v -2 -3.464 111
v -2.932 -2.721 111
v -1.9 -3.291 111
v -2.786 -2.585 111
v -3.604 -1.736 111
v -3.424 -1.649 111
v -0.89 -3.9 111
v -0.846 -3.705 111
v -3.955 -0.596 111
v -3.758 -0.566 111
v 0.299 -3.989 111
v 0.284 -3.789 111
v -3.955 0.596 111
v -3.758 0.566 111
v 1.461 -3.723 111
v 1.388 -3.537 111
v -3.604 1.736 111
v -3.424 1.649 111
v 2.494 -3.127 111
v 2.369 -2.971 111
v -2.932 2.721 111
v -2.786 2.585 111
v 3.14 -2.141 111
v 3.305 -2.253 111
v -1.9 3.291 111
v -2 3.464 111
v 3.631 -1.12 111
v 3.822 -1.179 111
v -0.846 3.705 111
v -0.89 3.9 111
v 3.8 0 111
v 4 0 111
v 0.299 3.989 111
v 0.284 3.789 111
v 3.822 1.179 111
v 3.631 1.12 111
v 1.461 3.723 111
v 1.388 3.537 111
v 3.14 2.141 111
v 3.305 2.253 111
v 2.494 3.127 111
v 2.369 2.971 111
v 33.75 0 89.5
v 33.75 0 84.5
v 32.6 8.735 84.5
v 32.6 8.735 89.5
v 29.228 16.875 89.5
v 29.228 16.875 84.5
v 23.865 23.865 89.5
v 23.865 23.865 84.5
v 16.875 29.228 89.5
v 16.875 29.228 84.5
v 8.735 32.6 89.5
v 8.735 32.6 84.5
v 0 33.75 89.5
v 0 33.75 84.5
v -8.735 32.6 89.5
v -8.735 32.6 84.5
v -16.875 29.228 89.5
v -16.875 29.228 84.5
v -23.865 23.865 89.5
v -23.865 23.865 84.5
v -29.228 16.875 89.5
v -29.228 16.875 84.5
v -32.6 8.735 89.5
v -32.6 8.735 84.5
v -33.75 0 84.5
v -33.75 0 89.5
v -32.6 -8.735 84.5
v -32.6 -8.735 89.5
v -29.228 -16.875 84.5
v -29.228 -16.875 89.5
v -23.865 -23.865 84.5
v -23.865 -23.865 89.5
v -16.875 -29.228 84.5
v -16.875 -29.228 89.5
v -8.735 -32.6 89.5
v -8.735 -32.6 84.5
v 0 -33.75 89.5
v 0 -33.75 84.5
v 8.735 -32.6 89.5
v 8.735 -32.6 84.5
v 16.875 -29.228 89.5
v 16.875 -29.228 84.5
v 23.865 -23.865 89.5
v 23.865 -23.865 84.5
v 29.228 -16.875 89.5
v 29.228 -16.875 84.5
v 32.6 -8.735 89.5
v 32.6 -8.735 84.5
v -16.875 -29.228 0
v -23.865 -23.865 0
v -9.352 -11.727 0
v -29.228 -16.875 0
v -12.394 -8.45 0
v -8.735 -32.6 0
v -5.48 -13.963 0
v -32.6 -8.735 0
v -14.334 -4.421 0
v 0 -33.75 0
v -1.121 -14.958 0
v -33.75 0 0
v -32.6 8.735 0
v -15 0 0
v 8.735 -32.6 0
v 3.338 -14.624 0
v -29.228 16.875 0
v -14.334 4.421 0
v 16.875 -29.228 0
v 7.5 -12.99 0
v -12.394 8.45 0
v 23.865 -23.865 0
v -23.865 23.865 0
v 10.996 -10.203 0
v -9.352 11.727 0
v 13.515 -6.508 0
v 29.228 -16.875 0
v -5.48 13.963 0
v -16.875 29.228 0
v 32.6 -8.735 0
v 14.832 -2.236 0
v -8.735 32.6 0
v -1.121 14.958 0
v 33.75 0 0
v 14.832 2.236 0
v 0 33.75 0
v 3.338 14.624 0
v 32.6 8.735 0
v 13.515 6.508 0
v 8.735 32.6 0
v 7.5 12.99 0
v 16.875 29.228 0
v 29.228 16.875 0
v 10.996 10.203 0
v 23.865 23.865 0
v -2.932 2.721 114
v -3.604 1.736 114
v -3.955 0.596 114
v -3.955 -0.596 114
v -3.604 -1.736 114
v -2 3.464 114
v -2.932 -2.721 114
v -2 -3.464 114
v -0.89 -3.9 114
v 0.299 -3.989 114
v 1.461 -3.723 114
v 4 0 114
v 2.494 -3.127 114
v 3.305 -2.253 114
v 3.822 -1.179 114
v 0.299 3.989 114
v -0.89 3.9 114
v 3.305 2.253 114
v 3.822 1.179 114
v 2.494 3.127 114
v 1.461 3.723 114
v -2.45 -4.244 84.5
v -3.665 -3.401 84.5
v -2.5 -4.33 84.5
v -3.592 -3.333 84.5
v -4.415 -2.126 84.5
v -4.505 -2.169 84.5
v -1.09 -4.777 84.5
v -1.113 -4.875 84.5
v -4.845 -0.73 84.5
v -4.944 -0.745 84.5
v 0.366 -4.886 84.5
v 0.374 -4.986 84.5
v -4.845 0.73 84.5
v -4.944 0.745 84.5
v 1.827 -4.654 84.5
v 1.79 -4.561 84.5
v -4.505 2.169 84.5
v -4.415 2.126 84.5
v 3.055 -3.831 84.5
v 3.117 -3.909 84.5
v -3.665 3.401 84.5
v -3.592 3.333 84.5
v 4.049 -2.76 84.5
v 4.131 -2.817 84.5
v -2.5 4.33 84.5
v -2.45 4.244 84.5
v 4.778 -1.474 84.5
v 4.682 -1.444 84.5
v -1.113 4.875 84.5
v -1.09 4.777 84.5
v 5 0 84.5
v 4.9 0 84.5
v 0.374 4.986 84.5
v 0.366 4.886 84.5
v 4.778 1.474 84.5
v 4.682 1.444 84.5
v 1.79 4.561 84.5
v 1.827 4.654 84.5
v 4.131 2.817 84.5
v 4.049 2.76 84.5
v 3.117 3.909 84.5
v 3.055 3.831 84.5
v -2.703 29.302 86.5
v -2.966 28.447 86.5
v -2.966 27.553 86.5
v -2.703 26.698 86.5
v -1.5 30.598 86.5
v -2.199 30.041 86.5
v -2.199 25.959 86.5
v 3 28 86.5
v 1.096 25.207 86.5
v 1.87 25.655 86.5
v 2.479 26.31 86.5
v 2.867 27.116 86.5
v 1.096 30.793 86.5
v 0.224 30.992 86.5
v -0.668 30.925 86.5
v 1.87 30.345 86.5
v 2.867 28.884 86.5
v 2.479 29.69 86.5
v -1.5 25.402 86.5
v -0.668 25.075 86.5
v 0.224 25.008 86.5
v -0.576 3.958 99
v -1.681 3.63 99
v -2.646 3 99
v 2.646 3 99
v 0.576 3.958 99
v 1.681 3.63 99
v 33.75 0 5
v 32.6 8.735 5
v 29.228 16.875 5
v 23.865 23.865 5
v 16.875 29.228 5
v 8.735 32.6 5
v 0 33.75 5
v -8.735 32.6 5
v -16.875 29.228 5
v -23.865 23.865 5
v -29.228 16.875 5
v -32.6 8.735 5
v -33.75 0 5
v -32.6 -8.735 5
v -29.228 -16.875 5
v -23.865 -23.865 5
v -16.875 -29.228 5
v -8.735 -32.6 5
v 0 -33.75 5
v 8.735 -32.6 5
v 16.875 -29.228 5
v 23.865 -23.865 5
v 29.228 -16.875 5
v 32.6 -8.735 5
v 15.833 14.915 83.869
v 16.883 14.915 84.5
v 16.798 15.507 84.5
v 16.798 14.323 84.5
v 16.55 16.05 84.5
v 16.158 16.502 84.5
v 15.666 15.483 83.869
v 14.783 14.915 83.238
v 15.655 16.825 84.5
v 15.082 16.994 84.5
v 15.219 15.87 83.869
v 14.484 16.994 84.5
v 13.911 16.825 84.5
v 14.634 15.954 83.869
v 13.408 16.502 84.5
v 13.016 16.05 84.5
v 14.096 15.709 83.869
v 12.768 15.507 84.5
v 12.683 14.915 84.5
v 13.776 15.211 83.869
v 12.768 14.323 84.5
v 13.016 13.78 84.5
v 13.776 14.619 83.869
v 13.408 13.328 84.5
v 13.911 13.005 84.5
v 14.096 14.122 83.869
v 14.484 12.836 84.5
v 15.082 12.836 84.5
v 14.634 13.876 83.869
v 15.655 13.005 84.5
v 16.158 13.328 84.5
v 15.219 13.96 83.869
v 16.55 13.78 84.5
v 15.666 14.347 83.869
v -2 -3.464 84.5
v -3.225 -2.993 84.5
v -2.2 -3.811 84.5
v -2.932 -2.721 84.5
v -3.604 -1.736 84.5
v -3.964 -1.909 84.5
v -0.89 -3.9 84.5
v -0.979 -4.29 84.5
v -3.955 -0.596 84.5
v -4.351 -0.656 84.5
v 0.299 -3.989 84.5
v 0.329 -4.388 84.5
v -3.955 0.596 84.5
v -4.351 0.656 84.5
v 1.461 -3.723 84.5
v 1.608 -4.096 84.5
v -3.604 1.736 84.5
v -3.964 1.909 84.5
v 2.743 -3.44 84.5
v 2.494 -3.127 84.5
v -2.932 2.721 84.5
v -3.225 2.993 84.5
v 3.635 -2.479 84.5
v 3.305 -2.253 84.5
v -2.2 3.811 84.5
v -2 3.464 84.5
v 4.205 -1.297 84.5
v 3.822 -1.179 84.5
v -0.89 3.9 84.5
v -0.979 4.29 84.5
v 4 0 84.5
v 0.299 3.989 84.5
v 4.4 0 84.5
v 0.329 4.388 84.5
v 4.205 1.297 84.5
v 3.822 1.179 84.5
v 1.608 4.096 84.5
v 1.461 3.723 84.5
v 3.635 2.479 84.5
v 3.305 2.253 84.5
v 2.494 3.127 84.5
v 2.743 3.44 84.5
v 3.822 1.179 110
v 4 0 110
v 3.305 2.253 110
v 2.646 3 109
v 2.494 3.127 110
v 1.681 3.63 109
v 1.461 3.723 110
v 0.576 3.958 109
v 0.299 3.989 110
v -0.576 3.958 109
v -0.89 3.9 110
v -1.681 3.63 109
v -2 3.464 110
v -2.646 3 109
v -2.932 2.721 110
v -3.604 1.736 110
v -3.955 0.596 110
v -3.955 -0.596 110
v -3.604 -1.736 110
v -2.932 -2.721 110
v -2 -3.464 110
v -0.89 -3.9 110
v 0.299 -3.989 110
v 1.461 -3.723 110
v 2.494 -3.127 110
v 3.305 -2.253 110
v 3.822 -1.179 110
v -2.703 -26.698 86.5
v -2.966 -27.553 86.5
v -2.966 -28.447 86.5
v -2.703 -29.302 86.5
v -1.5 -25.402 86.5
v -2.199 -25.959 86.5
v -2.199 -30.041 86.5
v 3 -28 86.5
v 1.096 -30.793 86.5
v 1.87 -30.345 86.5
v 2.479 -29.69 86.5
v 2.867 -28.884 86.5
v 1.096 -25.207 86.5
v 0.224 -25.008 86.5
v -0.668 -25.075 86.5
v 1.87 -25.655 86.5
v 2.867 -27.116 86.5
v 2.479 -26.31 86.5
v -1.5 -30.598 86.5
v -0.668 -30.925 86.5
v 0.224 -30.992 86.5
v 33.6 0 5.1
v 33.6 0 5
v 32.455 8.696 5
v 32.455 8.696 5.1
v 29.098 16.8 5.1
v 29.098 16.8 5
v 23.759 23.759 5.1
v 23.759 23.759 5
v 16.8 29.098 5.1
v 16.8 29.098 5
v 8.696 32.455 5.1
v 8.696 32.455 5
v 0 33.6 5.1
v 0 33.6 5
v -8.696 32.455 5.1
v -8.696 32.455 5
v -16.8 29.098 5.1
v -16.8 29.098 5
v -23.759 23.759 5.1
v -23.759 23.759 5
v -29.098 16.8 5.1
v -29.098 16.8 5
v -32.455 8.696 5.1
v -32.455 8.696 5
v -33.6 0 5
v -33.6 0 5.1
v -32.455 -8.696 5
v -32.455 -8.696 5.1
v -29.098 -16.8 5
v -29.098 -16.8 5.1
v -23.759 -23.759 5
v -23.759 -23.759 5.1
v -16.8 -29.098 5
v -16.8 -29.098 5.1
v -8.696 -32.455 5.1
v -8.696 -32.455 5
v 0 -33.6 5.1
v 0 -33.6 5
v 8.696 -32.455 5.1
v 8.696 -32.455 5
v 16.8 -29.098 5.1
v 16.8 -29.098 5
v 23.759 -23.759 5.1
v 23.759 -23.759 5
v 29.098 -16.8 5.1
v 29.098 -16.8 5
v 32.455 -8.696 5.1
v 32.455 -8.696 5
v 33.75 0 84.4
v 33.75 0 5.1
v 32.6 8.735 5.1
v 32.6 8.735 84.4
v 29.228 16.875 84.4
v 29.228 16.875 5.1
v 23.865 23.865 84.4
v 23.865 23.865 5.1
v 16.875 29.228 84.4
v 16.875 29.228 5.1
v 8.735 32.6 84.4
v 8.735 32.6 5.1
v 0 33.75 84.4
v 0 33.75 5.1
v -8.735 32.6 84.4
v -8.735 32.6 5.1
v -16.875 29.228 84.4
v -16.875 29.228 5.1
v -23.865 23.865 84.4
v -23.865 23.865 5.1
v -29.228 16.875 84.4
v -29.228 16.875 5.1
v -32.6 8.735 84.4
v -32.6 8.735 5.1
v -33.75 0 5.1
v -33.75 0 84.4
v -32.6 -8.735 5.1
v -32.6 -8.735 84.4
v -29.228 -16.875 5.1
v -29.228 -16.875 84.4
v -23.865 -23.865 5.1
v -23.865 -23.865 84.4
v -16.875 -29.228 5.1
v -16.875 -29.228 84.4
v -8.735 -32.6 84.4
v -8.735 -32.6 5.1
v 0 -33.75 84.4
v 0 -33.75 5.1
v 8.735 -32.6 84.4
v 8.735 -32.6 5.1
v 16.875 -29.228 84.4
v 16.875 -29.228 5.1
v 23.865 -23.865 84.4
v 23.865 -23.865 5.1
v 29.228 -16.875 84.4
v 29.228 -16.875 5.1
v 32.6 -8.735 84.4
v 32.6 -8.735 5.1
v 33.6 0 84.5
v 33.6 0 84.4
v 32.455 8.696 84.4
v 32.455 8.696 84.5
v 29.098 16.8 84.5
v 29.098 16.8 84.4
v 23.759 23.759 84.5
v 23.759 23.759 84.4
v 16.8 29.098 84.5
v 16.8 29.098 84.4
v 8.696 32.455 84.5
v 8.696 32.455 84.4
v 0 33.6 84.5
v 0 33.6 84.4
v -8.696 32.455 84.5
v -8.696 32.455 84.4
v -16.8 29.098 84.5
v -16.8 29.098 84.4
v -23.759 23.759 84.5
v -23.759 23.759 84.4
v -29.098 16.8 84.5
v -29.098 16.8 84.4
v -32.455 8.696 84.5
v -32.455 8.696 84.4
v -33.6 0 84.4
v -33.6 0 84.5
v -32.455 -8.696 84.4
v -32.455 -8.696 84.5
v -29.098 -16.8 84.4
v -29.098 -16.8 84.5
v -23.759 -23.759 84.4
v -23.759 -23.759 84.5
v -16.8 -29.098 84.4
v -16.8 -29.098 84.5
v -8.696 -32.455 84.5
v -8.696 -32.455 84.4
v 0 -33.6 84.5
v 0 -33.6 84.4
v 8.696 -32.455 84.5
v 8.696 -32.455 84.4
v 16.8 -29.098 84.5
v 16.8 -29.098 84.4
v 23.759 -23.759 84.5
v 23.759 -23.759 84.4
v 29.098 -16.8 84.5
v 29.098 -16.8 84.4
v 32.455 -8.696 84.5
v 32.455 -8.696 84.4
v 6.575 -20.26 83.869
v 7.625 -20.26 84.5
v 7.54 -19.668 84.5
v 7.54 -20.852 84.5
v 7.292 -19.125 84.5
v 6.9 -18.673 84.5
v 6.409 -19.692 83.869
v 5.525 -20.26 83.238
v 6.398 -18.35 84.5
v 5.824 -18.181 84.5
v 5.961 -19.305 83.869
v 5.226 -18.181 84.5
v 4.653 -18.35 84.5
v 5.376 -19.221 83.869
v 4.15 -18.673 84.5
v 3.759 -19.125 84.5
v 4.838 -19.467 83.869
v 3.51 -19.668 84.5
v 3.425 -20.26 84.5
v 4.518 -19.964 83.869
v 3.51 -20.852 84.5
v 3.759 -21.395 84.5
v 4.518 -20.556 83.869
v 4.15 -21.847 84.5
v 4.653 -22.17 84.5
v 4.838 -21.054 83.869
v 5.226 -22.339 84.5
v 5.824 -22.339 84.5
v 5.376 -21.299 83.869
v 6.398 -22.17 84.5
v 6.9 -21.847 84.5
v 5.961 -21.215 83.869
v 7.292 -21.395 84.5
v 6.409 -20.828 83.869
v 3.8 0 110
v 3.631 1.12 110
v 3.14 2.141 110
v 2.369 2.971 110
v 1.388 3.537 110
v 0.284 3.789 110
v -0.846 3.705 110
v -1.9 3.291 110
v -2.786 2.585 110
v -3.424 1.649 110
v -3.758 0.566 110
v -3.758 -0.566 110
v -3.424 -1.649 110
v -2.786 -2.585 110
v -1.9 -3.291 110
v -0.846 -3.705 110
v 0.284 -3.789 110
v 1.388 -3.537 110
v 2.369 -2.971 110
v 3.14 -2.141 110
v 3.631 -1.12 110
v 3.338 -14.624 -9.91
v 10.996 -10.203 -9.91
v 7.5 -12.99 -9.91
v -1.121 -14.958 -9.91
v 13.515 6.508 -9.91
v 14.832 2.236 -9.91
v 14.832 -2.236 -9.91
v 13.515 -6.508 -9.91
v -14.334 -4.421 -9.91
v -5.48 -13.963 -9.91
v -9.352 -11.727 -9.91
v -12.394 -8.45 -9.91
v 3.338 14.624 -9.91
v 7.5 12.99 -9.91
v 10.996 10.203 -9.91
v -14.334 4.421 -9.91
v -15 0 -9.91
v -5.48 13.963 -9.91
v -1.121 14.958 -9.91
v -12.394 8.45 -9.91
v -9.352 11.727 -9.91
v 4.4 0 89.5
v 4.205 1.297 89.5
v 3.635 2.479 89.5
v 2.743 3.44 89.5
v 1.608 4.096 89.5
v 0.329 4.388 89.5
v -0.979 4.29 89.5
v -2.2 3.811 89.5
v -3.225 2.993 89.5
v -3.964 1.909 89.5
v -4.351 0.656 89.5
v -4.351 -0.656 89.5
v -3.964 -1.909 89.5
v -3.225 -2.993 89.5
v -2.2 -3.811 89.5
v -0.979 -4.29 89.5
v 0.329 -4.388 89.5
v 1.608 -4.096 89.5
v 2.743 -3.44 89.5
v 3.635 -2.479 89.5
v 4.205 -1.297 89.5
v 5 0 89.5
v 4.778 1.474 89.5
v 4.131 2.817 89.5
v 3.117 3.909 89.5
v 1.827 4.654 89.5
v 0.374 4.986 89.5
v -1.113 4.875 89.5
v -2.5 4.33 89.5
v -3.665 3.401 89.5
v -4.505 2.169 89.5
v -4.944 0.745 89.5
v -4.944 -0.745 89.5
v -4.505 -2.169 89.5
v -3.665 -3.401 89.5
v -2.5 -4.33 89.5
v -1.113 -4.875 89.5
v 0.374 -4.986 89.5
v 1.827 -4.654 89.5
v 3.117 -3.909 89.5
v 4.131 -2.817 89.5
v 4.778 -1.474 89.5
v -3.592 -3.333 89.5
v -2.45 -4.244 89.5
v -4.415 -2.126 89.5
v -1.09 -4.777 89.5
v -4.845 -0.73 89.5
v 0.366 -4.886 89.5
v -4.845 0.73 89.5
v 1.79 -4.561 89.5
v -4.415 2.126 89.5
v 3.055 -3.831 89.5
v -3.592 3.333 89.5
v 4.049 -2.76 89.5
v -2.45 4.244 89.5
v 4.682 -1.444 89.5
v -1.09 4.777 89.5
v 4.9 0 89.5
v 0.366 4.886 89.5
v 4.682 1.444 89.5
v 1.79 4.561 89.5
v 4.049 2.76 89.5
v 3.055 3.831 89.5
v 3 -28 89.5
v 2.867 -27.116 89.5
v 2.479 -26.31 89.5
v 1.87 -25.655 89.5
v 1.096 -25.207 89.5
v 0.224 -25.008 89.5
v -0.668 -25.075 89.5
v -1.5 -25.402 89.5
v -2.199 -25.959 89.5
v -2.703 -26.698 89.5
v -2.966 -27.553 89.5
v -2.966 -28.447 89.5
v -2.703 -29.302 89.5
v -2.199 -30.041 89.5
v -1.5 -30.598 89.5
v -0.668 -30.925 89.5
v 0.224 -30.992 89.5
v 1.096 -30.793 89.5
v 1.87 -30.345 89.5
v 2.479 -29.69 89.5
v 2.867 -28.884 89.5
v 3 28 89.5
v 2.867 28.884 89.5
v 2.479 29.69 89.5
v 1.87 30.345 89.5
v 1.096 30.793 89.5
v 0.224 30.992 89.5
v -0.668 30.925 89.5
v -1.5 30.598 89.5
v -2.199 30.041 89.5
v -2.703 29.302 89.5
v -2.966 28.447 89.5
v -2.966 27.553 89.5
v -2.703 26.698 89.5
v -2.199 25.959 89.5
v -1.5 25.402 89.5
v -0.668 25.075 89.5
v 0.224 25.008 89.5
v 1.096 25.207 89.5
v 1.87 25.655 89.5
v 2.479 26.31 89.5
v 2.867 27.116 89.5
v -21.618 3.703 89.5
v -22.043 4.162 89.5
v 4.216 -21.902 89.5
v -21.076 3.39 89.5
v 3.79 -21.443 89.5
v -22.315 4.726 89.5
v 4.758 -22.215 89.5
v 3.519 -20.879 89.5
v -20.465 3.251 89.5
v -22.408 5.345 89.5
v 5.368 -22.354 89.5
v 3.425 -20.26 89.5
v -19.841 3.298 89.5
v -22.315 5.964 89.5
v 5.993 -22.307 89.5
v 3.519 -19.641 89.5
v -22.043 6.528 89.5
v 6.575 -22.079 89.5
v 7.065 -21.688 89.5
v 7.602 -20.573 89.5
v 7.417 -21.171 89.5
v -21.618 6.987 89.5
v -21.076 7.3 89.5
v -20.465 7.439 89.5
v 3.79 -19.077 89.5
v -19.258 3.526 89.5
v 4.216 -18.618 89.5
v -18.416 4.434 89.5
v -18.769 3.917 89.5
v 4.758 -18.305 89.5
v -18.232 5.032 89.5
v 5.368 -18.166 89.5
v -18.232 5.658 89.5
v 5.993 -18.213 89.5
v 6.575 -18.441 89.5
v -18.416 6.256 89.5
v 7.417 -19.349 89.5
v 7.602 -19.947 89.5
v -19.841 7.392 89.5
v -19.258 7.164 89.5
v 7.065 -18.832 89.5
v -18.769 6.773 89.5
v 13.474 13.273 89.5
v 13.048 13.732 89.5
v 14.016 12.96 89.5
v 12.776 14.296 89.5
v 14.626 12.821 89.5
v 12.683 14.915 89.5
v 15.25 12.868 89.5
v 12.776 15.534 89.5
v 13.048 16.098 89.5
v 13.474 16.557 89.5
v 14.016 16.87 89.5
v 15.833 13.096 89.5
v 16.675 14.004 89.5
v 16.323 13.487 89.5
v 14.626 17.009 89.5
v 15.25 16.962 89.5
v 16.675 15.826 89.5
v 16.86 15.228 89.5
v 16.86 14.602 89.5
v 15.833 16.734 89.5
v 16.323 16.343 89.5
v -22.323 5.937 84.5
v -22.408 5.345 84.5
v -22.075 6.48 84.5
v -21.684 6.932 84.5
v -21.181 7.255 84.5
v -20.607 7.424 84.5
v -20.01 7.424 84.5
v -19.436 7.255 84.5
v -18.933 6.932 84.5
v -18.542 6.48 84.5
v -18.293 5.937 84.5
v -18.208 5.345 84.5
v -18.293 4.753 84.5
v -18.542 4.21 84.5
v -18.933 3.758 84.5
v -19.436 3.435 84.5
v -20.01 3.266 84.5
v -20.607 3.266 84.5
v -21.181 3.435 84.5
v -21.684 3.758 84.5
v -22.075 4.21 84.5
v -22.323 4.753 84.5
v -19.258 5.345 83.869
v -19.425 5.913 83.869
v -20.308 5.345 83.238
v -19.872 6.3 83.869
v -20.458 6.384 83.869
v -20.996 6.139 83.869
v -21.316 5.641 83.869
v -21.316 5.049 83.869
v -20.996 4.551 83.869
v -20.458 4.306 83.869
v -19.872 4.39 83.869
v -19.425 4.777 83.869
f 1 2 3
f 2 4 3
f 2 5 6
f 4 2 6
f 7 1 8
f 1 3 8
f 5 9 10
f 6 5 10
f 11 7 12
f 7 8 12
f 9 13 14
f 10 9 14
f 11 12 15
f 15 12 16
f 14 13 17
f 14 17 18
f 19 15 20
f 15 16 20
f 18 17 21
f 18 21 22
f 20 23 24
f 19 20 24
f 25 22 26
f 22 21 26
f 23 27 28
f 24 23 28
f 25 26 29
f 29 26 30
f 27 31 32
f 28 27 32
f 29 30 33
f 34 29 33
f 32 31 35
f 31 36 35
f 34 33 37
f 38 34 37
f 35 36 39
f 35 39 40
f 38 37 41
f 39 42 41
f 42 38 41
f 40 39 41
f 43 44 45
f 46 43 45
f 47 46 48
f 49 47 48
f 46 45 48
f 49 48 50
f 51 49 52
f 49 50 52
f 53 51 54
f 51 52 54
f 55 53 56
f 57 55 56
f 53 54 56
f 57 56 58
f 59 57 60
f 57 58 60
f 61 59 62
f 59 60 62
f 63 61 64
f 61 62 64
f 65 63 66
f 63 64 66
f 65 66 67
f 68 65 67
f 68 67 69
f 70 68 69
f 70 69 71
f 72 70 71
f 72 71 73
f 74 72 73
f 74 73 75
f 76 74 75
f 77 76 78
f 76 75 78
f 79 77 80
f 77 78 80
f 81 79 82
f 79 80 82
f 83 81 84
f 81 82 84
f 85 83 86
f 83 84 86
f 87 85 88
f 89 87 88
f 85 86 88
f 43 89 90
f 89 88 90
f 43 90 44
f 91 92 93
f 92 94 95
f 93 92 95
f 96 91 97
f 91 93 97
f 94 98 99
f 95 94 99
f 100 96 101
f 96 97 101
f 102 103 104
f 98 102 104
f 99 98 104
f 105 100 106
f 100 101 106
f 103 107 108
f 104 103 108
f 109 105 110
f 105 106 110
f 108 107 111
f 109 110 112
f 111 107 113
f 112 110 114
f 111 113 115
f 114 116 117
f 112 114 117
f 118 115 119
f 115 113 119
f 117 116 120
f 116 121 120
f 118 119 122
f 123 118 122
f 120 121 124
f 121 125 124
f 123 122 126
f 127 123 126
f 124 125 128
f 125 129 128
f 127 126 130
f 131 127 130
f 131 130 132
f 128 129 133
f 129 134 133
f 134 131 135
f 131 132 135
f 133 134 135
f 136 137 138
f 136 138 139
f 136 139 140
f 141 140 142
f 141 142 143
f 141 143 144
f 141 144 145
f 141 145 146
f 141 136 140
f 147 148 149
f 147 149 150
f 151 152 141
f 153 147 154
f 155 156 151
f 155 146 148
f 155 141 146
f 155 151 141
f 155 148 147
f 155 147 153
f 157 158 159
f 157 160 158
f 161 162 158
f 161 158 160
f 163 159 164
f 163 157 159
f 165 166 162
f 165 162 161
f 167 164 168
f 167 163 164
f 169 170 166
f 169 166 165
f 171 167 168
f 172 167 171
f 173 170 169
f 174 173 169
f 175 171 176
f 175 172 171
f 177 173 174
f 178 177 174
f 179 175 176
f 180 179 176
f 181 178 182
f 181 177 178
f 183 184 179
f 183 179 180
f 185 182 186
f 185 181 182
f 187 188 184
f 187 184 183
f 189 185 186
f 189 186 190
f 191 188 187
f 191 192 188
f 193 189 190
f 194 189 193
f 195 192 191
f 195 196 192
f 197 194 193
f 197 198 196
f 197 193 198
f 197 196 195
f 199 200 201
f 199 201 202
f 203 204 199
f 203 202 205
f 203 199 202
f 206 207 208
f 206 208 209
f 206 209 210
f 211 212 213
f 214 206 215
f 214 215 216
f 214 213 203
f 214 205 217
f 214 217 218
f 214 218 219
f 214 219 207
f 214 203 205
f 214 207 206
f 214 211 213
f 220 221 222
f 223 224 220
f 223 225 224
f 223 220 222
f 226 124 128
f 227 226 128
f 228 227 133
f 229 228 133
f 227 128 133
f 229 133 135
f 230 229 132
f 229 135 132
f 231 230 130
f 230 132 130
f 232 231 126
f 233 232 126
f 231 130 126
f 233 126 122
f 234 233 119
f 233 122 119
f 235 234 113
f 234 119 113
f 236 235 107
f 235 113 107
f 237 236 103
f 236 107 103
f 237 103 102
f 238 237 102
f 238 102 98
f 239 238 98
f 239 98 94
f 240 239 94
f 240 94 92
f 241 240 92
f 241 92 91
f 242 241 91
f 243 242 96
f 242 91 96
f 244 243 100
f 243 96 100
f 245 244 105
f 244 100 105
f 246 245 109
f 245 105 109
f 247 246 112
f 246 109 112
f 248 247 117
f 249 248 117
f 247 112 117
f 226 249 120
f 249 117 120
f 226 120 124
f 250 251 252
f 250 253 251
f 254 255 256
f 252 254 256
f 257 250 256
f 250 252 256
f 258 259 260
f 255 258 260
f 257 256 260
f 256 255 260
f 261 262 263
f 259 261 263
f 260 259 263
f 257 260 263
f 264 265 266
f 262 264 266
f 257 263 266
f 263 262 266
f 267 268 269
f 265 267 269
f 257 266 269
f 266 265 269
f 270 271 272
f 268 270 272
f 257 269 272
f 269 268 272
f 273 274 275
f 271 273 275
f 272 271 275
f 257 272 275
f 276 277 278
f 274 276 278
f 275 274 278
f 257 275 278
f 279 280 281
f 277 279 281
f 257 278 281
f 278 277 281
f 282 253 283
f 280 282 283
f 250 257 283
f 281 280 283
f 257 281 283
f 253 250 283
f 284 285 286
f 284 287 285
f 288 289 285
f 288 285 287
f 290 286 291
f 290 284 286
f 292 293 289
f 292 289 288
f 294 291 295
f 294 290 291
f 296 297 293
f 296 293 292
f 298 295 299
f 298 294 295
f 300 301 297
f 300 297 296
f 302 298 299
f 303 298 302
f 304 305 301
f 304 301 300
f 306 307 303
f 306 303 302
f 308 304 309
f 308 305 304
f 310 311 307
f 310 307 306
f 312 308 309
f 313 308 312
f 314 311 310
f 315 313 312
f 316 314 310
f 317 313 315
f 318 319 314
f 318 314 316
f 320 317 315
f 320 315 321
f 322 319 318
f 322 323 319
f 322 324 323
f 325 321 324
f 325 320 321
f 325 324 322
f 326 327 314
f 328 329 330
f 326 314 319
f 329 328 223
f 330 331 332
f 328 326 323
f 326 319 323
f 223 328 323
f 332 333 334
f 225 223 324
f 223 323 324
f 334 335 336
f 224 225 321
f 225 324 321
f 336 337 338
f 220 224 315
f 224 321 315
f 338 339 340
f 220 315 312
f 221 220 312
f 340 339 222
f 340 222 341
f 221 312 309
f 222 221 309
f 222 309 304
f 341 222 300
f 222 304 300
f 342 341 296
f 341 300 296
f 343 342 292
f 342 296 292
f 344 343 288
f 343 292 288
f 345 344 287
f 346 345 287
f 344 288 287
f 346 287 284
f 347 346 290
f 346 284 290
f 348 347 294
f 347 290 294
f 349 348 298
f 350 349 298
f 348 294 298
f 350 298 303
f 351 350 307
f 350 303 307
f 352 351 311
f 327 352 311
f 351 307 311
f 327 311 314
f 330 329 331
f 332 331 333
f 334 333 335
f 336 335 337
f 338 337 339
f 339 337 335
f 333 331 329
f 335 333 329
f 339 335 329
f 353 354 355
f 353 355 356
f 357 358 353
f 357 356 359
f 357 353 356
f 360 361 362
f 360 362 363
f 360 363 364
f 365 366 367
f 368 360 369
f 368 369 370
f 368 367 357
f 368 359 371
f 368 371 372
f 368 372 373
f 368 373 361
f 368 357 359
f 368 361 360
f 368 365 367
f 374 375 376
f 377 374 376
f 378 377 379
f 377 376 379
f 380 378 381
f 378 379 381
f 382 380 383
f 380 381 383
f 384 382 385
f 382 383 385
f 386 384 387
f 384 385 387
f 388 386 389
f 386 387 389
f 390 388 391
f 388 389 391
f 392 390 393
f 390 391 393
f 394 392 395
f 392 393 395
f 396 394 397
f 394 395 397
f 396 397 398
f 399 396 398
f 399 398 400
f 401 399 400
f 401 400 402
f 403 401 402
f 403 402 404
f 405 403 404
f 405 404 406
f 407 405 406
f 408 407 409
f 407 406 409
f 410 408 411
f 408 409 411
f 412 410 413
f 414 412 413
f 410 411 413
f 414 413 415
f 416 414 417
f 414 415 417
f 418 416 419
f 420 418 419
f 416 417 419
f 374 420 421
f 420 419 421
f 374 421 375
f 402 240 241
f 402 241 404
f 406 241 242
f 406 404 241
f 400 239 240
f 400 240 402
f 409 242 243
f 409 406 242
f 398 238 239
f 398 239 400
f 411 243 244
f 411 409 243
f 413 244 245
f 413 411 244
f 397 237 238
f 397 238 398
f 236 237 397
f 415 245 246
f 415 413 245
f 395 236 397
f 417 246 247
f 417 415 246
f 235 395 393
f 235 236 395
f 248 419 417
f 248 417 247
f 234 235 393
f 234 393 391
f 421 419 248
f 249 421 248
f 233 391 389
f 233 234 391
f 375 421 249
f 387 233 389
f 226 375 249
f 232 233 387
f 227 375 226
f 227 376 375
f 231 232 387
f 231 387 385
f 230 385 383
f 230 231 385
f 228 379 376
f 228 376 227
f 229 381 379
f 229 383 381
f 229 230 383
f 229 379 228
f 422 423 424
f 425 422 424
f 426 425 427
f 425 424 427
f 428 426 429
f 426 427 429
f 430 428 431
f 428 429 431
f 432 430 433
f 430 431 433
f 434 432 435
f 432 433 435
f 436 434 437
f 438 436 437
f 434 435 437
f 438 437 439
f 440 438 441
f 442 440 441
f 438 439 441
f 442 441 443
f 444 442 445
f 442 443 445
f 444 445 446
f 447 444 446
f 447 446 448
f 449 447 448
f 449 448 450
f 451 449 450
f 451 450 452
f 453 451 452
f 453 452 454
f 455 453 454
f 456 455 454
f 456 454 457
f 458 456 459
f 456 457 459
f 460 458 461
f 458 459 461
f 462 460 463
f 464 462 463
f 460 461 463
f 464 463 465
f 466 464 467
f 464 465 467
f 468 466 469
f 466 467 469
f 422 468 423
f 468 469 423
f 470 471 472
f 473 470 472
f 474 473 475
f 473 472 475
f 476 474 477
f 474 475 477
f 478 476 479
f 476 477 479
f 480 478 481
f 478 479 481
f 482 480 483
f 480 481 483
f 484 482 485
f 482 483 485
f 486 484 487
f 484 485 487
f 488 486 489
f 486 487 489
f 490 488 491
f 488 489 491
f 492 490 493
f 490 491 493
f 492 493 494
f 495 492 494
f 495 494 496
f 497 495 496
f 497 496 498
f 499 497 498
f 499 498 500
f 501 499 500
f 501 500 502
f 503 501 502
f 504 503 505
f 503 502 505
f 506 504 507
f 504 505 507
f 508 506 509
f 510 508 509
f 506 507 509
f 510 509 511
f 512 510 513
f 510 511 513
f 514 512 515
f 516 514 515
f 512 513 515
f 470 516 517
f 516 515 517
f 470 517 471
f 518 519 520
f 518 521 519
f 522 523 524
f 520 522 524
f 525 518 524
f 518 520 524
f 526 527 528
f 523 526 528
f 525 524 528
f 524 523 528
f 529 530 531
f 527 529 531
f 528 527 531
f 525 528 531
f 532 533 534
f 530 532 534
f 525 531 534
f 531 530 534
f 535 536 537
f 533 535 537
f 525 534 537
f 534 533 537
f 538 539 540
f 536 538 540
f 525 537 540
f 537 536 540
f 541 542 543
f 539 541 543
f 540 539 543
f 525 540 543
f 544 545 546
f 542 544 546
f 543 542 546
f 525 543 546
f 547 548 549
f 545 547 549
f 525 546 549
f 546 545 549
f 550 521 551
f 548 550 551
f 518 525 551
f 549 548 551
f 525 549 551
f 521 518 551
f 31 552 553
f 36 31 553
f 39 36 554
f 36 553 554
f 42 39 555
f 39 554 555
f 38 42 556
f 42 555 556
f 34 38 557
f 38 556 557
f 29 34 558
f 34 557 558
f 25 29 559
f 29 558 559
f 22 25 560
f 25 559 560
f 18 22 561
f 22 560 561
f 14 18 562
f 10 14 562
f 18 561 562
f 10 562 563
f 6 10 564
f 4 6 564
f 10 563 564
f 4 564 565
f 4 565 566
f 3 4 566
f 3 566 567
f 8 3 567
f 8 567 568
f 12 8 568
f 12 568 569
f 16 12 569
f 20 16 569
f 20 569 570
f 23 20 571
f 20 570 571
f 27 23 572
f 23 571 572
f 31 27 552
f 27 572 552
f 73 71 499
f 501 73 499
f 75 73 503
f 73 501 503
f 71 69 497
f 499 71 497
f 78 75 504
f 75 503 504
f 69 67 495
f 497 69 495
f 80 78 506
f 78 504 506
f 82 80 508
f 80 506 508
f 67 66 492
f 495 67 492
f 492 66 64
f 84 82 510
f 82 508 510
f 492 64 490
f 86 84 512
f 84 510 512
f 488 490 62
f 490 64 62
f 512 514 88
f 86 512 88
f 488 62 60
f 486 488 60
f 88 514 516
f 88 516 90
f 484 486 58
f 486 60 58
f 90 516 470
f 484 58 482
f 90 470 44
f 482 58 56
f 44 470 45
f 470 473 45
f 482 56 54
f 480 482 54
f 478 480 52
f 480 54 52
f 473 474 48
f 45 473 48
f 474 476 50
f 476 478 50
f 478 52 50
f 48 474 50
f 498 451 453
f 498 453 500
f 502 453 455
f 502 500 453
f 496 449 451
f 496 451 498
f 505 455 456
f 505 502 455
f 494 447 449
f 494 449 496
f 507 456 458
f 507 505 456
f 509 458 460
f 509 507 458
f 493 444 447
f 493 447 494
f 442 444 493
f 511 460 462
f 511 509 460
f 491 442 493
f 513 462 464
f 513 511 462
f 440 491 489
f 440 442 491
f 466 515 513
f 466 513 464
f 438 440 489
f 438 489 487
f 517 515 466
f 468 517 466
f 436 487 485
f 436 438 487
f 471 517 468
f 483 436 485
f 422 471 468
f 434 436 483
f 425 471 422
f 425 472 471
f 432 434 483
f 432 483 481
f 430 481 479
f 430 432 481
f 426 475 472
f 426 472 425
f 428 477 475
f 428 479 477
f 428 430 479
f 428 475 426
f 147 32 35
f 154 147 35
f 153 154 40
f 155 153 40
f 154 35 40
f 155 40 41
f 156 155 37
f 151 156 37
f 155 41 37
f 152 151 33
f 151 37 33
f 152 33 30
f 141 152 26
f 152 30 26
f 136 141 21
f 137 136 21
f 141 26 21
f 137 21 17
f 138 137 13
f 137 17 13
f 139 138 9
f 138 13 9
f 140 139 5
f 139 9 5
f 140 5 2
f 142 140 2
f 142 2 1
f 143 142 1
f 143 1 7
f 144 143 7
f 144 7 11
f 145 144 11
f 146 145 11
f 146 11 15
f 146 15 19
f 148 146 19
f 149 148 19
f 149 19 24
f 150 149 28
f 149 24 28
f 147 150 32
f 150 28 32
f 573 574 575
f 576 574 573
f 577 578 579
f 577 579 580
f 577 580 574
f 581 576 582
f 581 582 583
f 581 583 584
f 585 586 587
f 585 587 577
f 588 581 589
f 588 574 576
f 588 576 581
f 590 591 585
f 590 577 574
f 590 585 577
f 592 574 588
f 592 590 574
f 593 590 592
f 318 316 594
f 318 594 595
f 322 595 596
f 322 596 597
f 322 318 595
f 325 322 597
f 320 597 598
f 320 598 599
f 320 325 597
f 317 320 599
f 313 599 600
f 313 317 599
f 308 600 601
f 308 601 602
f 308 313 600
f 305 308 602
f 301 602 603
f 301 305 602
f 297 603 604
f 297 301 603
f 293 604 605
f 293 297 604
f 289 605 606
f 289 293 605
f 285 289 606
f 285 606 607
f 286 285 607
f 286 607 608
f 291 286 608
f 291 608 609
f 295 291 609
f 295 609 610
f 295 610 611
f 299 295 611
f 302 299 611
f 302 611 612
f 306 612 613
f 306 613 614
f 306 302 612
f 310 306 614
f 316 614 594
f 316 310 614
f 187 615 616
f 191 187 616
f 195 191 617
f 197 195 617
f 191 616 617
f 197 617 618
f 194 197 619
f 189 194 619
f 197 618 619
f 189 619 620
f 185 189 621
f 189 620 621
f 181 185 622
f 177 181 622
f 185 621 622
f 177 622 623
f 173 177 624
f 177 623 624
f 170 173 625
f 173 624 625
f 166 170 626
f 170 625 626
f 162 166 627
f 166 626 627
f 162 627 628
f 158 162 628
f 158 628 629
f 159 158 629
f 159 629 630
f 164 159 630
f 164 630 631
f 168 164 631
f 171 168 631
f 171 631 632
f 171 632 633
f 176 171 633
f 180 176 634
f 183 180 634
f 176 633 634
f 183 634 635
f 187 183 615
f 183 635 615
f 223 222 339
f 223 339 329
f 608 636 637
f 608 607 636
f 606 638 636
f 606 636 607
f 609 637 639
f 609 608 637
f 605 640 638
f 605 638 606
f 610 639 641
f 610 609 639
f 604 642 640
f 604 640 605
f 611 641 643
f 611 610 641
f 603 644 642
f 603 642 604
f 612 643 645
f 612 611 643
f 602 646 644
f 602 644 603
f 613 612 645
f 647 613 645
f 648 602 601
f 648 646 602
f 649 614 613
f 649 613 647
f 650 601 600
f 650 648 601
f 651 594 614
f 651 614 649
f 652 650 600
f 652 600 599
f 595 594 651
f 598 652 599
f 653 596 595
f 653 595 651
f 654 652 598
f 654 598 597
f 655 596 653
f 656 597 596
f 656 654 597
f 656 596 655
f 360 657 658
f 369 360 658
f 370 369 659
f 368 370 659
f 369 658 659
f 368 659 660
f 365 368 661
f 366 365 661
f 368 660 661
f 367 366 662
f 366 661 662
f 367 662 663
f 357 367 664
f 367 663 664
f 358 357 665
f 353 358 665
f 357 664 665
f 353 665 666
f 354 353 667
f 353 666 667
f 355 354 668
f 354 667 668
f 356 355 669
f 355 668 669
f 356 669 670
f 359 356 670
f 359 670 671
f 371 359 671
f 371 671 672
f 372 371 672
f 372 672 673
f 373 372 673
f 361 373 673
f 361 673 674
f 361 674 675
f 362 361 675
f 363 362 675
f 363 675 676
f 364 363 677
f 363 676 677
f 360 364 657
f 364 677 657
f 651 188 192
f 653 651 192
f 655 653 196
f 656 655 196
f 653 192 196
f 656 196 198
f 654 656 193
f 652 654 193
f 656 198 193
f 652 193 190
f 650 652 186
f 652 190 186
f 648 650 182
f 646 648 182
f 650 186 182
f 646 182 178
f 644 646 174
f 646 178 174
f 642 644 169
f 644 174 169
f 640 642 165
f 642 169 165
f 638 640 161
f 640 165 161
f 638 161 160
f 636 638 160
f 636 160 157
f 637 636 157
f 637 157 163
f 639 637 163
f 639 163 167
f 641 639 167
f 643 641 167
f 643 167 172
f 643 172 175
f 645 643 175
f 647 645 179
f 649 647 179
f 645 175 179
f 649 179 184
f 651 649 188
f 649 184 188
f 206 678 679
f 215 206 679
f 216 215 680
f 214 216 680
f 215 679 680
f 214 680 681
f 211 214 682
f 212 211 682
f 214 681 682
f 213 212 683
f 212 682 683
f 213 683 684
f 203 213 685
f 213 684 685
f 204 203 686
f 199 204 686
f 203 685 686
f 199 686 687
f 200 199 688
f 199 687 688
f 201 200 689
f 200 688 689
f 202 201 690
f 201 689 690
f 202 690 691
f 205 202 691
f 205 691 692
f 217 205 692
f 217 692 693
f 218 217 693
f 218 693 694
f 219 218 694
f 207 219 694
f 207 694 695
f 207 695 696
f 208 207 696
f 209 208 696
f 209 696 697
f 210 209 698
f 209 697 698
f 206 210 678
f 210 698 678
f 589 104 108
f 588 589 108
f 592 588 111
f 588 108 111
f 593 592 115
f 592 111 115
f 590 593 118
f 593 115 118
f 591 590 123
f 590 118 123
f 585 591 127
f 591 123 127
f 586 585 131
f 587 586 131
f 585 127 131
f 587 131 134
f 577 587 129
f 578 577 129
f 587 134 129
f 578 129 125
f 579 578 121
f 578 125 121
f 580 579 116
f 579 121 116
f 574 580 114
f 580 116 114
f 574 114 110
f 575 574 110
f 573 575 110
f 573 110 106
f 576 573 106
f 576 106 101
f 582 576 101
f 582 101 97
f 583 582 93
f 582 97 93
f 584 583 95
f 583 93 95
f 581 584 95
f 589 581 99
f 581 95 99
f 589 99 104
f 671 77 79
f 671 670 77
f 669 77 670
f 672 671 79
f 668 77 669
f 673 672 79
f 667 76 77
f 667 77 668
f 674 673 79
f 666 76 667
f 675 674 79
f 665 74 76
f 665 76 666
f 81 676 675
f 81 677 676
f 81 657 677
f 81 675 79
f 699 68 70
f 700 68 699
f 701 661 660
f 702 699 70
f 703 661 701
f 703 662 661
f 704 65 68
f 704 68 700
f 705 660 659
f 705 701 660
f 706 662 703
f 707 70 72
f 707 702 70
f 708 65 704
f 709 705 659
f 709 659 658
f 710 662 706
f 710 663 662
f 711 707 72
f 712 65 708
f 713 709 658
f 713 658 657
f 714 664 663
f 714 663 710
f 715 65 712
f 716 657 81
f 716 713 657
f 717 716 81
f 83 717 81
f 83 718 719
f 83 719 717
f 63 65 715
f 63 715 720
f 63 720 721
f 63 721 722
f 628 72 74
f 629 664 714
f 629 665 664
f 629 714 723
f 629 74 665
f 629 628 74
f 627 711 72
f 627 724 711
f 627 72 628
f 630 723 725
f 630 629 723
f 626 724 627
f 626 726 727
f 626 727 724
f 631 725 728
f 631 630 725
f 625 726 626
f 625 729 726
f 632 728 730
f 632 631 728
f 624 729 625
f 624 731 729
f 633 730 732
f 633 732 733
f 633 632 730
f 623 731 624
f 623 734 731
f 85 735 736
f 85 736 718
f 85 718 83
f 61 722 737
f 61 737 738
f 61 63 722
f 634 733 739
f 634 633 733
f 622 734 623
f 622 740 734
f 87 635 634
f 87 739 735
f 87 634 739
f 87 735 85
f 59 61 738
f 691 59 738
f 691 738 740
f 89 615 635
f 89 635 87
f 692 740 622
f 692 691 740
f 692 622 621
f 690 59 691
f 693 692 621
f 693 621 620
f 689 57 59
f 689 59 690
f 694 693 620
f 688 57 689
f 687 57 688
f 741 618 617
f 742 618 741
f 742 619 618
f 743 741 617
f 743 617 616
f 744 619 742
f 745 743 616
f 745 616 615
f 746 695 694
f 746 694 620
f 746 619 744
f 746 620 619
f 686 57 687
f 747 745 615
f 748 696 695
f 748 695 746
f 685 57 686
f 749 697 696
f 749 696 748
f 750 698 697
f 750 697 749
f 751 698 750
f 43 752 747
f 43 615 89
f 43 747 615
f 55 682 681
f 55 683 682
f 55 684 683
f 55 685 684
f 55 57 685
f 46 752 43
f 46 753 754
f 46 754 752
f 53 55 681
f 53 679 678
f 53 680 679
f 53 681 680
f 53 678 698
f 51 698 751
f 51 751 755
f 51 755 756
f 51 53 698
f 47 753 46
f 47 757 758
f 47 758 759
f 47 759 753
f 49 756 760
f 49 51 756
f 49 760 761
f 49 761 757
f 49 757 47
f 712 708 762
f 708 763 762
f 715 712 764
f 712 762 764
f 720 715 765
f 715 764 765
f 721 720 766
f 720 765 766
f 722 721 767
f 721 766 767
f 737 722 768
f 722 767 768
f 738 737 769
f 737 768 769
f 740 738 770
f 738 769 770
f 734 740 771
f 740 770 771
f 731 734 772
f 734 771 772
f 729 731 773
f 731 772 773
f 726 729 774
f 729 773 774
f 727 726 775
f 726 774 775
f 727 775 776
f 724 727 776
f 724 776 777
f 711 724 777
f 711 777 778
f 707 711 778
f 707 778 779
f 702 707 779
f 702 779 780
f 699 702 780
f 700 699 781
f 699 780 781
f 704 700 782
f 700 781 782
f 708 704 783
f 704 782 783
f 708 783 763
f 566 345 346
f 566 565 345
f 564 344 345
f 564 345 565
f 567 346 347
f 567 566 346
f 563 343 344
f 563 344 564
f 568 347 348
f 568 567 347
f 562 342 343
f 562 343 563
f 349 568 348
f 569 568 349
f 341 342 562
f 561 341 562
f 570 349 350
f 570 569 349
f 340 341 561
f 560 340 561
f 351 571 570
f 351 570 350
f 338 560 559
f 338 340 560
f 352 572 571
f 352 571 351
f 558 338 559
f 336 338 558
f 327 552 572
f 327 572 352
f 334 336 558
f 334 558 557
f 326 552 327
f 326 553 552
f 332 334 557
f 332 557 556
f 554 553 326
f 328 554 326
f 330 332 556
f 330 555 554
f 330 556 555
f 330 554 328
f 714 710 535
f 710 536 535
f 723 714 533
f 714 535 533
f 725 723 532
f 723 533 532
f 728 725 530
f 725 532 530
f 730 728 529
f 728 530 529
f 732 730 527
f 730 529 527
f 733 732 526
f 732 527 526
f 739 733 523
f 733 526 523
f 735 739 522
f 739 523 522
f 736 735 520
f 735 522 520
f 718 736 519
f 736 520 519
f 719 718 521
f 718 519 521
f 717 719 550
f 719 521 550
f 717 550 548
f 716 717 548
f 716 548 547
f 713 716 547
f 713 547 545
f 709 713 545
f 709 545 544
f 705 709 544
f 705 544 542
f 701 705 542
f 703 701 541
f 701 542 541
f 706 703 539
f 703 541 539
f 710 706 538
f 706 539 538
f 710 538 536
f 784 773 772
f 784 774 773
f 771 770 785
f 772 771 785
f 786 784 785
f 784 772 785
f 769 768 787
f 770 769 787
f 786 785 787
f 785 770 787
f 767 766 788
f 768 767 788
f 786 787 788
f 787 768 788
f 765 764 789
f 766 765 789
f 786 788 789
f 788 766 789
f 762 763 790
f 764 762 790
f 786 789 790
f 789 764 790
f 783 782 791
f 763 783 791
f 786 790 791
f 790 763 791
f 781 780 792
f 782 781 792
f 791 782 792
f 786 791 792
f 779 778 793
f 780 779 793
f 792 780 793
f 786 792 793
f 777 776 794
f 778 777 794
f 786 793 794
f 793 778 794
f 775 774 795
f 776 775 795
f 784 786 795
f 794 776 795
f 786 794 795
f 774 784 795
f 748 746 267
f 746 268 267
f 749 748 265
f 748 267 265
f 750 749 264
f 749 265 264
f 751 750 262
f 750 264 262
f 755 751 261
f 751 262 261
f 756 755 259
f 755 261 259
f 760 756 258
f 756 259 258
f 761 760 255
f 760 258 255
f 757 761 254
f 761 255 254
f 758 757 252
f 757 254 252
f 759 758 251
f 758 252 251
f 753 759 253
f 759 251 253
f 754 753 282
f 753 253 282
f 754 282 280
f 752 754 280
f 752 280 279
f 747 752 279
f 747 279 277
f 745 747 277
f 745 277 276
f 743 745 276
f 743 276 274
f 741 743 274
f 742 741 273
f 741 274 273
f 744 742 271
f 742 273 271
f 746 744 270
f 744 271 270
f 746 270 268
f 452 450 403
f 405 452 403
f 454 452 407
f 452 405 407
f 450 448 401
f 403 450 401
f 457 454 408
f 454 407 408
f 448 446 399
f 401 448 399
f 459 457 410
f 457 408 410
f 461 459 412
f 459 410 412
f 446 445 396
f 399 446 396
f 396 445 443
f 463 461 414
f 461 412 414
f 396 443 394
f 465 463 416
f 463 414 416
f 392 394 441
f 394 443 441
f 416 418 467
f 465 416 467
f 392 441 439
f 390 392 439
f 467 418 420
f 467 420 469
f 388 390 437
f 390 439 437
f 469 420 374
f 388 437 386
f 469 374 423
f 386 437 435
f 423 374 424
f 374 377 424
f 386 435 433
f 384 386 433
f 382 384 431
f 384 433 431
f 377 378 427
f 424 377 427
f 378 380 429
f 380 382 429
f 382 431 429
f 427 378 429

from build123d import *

# Parameters (mm, degrees)
SKETCH1_R             = 33.75
BOSS_EXTRUDE1_DEPTH   = 5
SKETCH2_R             = 33.6
BOSS_EXTRUDE2_DEPTH   = 0.1
SKETCH3_R             = 33.75
BOSS_EXTRUDE3_DEPTH   = 79.3
SKETCH4_R             = 33.6
BOSS_EXTRUDE4_DEPTH   = 0.1
SKETCH5_R             = 33.75
BOSS_EXTRUDE5_DEPTH   = 5
SKETCH6_R             = 5
CUT_EXTRUDE1_DEPTH    = 5
SKETCH7_R             = 4.9
SKETCH7_R_2           = 4.4
BOSS_EXTRUDE6_DEPTH   = 5
SKETCH8_R             = 4
BOSS_EXTRUDE7_DEPTH   = 24.5
SKETCH9_R             = 15
BOSS_EXTRUDE8_DEPTH   = 9.91
M5_TAPPED_HOLE1_D     = 4.2
M5_TAPPED_HOLE1_DEPTH = 5
M5_TAPPED_HOLE1_TIP   = 1.2618073
SKETCH12_W            = 8
SKETCH12_H            = 10
CUT_EXTRUDE2_DEPTH    = 1
SKETCH13_R            = 4
BOSS_EXTRUDE9_DEPTH   = 1
SKETCH14_R            = 3.8
BOSS_EXTRUDE10_DEPTH  = 1
SKETCH15_R            = 4
BOSS_EXTRUDE11_DEPTH  = 3
SKETCH16_R            = 3
CUT_EXTRUDE3_DEPTH    = 3


with BuildPart() as part:
    # Sketch1 → Boss-Extrude1 (new body)
    with BuildSketch(Plane.XY):
        Circle(SKETCH1_R)
    extrude(amount=BOSS_EXTRUDE1_DEPTH)

    # Sketch2 → Boss-Extrude2 (add)
    with BuildSketch(Plane.XY.offset(5)):
        Circle(SKETCH2_R)
    extrude(amount=BOSS_EXTRUDE2_DEPTH)

    # Sketch3 → Boss-Extrude3 (add)
    with BuildSketch(Plane.XY.offset(5.1)):
        Circle(SKETCH3_R)
    extrude(amount=BOSS_EXTRUDE3_DEPTH)

    # Sketch4 → Boss-Extrude4 (add)
    with BuildSketch(Plane.XY.offset(84.4)):
        Circle(SKETCH4_R)
    extrude(amount=BOSS_EXTRUDE4_DEPTH)

    # Sketch5 → Boss-Extrude5 (add)
    with BuildSketch(Plane.XY.offset(84.5)):
        Circle(SKETCH5_R)
    extrude(amount=BOSS_EXTRUDE5_DEPTH)

    # Sketch6 → Cut-Extrude1 (cut)
    with BuildSketch(Plane.XY.offset(89.5)):
        Circle(SKETCH6_R)
    extrude(amount=-CUT_EXTRUDE1_DEPTH, mode=Mode.SUBTRACT)

    # Sketch7 → Boss-Extrude6 (add)
    with BuildSketch(Plane.XY.offset(84.5)):
        Circle(SKETCH7_R)
        Circle(SKETCH7_R_2, mode=Mode.SUBTRACT)
    extrude(amount=BOSS_EXTRUDE6_DEPTH)

    # Sketch8 → Boss-Extrude7 (add)
    with BuildSketch(Plane.XY.offset(84.5)):
        Circle(SKETCH8_R)
    extrude(amount=BOSS_EXTRUDE7_DEPTH)

    # Sketch9 → Boss-Extrude8 (add)
    with BuildSketch(Plane(origin=(0, 0, 0), x_dir=(-1, 0, 0), z_dir=(0, 0, -1))):
        Circle(SKETCH9_R)
    extrude(amount=BOSS_EXTRUDE8_DEPTH)

    # M5 Tapped Hole1
    with Locations(Plane(origin=(-20.308390576, 5.345023126, 89.5), x_dir=(1, 0, 0), z_dir=(0, 0, 1))):
        with Locations((0, 0), (35.091511675, 9.57004746), (25.833660053, -25.605116838)):
            Hole(M5_TAPPED_HOLE1_D / 2, depth=M5_TAPPED_HOLE1_DEPTH)
            with Locations((0, 0, -(M5_TAPPED_HOLE1_DEPTH + M5_TAPPED_HOLE1_TIP / 2))):  # 118° drill point
                Cone(0, M5_TAPPED_HOLE1_D / 2, M5_TAPPED_HOLE1_TIP, mode=Mode.SUBTRACT)

    # Sketch12 → Cut-Extrude2 (cut)
    with BuildSketch(Plane(origin=(0, 4, 0), x_dir=(1, 0, 0), z_dir=(0, 1, 0))):
        with Locations((0, -104)):
            Rectangle(SKETCH12_W, SKETCH12_H)
    extrude(amount=-CUT_EXTRUDE2_DEPTH, mode=Mode.SUBTRACT)

    # Sketch13 → Boss-Extrude9 (add)
    with BuildSketch(Plane.XY.offset(109)):
        Circle(SKETCH13_R)
    extrude(amount=BOSS_EXTRUDE9_DEPTH)

    # Sketch14 → Boss-Extrude10 (add)
    with BuildSketch(Plane.XY.offset(110)):
        Circle(SKETCH14_R)
    extrude(amount=BOSS_EXTRUDE10_DEPTH)

    # Sketch15 → Boss-Extrude11 (add)
    with BuildSketch(Plane.XY.offset(111)):
        Circle(SKETCH15_R)
    extrude(amount=BOSS_EXTRUDE11_DEPTH)

    # Sketch16 → Cut-Extrude3 (cut)
    with BuildSketch(Plane.XY.offset(89.5)):
        with Locations((0, 28)):
            Circle(SKETCH16_R)
        with Locations((0, -28)):
            Circle(SKETCH16_R)
    extrude(amount=-CUT_EXTRUDE3_DEPTH, mode=Mode.SUBTRACT)


solid = part.part
